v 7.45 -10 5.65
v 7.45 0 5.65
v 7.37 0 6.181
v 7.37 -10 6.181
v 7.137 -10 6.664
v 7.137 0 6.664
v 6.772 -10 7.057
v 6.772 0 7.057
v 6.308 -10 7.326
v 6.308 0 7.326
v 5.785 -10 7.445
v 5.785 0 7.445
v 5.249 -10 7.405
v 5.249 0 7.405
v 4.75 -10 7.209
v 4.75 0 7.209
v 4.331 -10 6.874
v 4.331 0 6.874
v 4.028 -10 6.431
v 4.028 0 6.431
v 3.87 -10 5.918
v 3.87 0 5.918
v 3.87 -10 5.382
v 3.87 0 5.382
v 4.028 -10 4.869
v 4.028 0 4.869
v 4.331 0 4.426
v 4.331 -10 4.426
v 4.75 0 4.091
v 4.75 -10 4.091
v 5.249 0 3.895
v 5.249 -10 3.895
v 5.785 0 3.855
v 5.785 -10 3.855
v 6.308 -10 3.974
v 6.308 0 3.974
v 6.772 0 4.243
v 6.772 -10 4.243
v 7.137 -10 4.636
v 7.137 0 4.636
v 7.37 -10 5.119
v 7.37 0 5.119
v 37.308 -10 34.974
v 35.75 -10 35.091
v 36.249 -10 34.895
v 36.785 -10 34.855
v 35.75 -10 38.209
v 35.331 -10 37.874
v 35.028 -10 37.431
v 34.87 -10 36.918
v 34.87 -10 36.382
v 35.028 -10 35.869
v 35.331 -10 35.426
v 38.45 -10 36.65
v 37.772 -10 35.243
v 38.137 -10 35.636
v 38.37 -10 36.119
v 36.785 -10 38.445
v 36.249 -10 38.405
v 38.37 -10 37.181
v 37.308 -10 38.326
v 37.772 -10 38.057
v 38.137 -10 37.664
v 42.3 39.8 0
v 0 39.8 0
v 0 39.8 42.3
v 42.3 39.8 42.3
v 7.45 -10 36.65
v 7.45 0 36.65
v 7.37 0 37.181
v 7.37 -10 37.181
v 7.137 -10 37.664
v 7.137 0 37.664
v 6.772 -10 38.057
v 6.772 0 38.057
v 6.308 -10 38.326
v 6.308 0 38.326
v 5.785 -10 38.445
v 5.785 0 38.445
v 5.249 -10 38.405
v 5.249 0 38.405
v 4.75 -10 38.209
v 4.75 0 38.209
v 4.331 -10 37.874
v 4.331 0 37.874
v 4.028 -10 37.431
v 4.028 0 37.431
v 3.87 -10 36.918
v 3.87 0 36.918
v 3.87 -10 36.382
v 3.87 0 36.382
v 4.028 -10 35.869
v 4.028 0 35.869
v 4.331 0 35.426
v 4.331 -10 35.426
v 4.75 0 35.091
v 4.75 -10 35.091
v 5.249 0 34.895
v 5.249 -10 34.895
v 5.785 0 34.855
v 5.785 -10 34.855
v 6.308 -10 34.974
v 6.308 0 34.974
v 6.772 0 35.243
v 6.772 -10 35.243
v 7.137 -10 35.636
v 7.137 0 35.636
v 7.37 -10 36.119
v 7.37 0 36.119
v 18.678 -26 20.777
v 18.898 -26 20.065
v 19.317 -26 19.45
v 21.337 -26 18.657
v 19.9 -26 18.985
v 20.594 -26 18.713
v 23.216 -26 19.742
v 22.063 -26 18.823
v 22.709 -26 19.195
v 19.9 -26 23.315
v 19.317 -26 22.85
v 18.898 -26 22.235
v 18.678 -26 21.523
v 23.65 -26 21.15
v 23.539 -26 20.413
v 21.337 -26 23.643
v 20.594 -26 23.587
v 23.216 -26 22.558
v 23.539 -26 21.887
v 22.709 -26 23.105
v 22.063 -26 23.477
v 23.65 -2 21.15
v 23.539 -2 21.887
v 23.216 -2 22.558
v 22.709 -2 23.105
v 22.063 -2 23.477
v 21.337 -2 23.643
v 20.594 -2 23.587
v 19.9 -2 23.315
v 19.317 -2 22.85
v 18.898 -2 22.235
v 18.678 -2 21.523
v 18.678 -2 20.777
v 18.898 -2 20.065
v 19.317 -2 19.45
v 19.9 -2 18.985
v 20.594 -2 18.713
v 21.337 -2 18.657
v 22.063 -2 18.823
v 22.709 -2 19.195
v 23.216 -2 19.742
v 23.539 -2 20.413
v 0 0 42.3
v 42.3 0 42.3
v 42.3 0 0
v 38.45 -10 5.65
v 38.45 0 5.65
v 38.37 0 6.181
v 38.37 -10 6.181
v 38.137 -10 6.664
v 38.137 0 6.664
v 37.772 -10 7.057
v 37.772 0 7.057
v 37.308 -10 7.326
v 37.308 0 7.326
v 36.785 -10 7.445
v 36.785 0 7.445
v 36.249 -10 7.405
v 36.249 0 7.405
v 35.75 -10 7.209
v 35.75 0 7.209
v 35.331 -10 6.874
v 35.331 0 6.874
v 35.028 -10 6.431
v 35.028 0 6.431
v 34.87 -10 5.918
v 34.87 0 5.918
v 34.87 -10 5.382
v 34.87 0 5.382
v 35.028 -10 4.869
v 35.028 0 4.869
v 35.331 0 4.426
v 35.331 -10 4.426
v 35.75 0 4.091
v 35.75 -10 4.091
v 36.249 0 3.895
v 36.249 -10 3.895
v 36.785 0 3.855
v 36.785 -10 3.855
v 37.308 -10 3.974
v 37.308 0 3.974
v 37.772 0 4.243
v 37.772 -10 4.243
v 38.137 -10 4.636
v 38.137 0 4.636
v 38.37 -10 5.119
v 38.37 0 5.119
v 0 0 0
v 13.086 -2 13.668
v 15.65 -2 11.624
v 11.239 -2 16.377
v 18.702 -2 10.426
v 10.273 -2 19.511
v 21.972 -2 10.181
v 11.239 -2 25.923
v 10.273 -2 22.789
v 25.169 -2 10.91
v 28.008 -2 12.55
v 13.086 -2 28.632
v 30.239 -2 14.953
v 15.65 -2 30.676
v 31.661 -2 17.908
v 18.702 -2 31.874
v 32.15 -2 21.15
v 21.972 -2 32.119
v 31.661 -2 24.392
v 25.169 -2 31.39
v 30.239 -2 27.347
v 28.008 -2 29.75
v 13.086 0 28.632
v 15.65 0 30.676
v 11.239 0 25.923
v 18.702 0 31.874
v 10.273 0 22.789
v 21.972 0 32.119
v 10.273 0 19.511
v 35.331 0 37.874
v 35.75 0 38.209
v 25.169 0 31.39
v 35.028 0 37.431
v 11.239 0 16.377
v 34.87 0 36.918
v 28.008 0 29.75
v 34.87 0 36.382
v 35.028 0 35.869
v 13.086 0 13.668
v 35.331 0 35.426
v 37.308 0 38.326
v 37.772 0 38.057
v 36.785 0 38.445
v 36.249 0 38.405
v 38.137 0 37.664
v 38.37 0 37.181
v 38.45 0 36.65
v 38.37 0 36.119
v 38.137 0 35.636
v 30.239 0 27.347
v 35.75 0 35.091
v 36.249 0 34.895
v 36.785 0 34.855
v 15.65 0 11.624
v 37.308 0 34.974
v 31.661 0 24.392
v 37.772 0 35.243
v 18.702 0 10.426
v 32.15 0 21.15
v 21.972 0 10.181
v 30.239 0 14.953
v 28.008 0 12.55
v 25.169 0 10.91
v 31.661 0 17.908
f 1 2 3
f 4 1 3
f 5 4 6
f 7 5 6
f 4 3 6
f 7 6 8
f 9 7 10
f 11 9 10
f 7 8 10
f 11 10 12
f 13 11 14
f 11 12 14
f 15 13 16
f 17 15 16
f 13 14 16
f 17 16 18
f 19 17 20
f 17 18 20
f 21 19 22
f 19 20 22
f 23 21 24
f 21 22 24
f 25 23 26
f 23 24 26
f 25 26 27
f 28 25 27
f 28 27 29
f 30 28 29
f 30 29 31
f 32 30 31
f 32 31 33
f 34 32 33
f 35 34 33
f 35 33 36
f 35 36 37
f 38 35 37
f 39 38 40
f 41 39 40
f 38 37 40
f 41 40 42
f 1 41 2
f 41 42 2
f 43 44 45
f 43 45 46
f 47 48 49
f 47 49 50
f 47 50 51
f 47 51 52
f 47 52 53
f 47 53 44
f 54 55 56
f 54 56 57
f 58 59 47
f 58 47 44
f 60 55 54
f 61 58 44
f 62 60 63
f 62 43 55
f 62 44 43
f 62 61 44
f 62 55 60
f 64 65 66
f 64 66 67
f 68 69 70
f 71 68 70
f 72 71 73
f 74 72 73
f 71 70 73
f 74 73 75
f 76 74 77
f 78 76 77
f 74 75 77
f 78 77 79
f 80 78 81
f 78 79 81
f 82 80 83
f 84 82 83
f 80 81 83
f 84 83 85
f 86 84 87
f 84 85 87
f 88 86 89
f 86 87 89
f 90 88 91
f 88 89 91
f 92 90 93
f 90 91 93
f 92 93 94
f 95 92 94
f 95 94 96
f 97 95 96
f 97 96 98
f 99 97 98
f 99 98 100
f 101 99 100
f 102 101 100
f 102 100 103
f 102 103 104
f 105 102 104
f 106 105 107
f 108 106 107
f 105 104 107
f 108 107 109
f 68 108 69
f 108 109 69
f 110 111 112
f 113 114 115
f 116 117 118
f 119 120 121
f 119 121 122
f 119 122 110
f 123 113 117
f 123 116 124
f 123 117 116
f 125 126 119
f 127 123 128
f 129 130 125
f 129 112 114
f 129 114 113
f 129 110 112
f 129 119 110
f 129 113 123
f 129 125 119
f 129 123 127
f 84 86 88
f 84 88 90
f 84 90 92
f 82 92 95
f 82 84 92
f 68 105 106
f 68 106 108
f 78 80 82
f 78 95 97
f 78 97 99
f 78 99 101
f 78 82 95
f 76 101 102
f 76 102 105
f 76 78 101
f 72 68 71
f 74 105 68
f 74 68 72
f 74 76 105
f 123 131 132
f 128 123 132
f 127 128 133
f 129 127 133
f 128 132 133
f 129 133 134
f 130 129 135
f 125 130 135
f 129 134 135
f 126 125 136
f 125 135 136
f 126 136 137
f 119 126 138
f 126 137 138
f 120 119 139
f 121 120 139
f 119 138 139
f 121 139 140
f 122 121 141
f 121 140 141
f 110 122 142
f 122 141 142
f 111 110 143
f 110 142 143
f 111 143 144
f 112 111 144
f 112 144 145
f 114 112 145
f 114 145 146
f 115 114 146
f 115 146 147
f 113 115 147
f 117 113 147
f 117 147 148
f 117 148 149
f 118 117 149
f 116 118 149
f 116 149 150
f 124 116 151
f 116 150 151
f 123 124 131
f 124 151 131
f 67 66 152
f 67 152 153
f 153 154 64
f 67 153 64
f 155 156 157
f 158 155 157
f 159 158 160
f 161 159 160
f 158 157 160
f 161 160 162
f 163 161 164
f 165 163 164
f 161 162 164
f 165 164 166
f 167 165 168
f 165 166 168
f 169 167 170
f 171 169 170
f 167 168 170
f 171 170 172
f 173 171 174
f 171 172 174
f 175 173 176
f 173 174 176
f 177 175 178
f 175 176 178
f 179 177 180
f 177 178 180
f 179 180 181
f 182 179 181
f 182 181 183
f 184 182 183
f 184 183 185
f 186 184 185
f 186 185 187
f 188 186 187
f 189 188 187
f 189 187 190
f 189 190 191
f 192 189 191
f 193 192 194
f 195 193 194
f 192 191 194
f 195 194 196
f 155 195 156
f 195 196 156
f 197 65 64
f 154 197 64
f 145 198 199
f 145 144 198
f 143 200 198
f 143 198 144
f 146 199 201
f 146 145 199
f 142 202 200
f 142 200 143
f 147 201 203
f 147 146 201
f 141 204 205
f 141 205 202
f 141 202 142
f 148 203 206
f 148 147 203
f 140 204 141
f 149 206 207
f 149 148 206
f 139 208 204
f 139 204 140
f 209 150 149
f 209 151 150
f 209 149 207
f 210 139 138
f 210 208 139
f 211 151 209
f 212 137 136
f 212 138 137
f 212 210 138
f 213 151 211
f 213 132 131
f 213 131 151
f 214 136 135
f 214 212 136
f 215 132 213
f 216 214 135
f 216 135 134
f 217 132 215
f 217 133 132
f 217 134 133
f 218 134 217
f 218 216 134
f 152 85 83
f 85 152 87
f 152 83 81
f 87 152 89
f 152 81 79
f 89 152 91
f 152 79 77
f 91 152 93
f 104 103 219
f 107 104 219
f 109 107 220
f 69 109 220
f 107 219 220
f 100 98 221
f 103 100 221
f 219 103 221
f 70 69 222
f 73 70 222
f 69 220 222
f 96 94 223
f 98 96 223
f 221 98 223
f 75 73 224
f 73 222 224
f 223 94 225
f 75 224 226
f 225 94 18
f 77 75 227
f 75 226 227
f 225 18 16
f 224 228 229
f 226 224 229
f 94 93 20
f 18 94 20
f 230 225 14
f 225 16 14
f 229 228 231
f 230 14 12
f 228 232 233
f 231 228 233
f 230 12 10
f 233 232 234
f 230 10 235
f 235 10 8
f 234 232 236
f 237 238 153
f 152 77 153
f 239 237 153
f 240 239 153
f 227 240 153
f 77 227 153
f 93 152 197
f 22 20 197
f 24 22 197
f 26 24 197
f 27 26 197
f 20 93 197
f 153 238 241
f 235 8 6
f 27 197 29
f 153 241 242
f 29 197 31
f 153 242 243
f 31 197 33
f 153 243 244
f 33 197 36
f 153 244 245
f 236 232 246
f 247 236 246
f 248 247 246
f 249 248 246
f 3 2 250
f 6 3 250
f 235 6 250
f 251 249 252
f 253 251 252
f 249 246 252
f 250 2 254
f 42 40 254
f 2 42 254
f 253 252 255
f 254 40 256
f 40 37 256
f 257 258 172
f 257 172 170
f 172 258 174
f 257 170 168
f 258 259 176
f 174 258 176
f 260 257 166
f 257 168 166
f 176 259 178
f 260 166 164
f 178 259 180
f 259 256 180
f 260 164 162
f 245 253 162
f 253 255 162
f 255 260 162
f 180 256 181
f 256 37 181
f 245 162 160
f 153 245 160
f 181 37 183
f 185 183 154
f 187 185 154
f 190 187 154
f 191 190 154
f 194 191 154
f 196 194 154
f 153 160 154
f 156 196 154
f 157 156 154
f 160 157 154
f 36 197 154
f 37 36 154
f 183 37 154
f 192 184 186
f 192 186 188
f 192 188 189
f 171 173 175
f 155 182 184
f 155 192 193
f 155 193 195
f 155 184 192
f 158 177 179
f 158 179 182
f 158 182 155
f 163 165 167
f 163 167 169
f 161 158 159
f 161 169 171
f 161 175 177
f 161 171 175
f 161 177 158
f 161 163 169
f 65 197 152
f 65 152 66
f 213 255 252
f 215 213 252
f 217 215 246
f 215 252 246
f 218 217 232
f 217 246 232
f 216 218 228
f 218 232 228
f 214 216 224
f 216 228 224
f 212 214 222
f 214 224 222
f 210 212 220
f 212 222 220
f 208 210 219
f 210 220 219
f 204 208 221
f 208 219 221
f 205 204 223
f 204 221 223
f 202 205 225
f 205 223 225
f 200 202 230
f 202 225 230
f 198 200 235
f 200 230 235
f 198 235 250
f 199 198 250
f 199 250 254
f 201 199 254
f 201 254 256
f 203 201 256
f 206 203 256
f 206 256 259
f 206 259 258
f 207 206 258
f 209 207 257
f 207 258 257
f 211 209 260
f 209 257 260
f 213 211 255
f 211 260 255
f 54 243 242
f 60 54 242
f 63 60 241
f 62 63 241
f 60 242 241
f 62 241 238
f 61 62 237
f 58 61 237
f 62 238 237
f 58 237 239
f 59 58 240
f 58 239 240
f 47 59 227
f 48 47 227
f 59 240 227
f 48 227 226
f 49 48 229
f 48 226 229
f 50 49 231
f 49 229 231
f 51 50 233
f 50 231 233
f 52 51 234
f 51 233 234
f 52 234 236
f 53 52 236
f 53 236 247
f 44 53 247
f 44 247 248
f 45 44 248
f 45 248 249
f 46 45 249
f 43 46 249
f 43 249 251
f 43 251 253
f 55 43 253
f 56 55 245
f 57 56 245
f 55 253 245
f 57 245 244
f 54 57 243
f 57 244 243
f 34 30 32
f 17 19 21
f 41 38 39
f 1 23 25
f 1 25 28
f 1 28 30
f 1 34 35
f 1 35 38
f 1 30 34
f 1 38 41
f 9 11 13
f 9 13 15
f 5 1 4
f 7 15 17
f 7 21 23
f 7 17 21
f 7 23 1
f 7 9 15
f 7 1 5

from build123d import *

# Parameters (mm, degrees)
CYLINDER004_R     = 1.8
CYLINDER004_DEPTH = 10
CYLINDER005_R     = 1.8
CYLINDER005_DEPTH = 10
CYLINDER002_R     = 1.8
CYLINDER002_DEPTH = 10
CYLINDER003_R     = 1.8
CYLINDER003_DEPTH = 10
CYLINDER001_R     = 2.5
CYLINDER001_DEPTH = 24
CYLINDER_R        = 11
CYLINDER_DEPTH    = 2
BOX_W             = 42.3
BOX_H             = 39.8
BOX_DEPTH         = 42.3


with BuildPart() as cylinder004:
    # Cylinder004 → Cylinder004 (new body)
    with BuildSketch(Plane(origin=(5.65, 0, 36.65), x_dir=(1, 0, 0), z_dir=(0, -1, 0))):
        Circle(CYLINDER004_R)
    extrude(amount=CYLINDER004_DEPTH)


with BuildPart() as cylinder005:
    # Cylinder005 → Cylinder005 (new body)
    with BuildSketch(Plane(origin=(36.65, 0, 36.65), x_dir=(1, 0, 0), z_dir=(0, -1, 0))):
        Circle(CYLINDER005_R)
    extrude(amount=CYLINDER005_DEPTH)


with BuildPart() as cylinder002:
    # Cylinder002 → Cylinder002 (new body)
    with BuildSketch(Plane(origin=(5.65, 0, 5.65), x_dir=(1, 0, 0), z_dir=(0, -1, 0))):
        Circle(CYLINDER002_R)
    extrude(amount=CYLINDER002_DEPTH)


with BuildPart() as cylinder003:
    # Cylinder003 → Cylinder003 (new body)
    with BuildSketch(Plane(origin=(36.65, 0, 5.65), x_dir=(1, 0, 0), z_dir=(0, -1, 0))):
        Circle(CYLINDER003_R)
    extrude(amount=CYLINDER003_DEPTH)


with BuildPart() as cylinder001:
    # Cylinder001 → Cylinder001 (new body)
    with BuildSketch(Plane(origin=(21.15, -2, 21.15), x_dir=(1, 0, 0), z_dir=(0, -1, 0))):
        Circle(CYLINDER001_R)
    extrude(amount=CYLINDER001_DEPTH)


with BuildPart() as cylinder:
    # Cylinder → Cylinder (new body)
    with BuildSketch(Plane(origin=(21.15, 0, 21.15), x_dir=(1, 0, 0), z_dir=(0, -1, 0))):
        Circle(CYLINDER_R)
    extrude(amount=CYLINDER_DEPTH)


with BuildPart() as fusion002:
    # Box → Box (new body)
    with BuildSketch(Plane.XY):
        with Locations((21.15, 19.9)):
            Rectangle(BOX_W, BOX_H)
    extrude(amount=BOX_DEPTH)

    # Fusion: union Cylinder
    add(cylinder.part)

    # Fusion001: union Cylinder001
    add(cylinder001.part)

    # Fusion002: union Cylinder004, Cylinder005, Cylinder002, Cylinder003
    add(cylinder004.part)
    add(cylinder005.part)
    add(cylinder002.part)
    add(cylinder003.part)


solid = fusion002.part
